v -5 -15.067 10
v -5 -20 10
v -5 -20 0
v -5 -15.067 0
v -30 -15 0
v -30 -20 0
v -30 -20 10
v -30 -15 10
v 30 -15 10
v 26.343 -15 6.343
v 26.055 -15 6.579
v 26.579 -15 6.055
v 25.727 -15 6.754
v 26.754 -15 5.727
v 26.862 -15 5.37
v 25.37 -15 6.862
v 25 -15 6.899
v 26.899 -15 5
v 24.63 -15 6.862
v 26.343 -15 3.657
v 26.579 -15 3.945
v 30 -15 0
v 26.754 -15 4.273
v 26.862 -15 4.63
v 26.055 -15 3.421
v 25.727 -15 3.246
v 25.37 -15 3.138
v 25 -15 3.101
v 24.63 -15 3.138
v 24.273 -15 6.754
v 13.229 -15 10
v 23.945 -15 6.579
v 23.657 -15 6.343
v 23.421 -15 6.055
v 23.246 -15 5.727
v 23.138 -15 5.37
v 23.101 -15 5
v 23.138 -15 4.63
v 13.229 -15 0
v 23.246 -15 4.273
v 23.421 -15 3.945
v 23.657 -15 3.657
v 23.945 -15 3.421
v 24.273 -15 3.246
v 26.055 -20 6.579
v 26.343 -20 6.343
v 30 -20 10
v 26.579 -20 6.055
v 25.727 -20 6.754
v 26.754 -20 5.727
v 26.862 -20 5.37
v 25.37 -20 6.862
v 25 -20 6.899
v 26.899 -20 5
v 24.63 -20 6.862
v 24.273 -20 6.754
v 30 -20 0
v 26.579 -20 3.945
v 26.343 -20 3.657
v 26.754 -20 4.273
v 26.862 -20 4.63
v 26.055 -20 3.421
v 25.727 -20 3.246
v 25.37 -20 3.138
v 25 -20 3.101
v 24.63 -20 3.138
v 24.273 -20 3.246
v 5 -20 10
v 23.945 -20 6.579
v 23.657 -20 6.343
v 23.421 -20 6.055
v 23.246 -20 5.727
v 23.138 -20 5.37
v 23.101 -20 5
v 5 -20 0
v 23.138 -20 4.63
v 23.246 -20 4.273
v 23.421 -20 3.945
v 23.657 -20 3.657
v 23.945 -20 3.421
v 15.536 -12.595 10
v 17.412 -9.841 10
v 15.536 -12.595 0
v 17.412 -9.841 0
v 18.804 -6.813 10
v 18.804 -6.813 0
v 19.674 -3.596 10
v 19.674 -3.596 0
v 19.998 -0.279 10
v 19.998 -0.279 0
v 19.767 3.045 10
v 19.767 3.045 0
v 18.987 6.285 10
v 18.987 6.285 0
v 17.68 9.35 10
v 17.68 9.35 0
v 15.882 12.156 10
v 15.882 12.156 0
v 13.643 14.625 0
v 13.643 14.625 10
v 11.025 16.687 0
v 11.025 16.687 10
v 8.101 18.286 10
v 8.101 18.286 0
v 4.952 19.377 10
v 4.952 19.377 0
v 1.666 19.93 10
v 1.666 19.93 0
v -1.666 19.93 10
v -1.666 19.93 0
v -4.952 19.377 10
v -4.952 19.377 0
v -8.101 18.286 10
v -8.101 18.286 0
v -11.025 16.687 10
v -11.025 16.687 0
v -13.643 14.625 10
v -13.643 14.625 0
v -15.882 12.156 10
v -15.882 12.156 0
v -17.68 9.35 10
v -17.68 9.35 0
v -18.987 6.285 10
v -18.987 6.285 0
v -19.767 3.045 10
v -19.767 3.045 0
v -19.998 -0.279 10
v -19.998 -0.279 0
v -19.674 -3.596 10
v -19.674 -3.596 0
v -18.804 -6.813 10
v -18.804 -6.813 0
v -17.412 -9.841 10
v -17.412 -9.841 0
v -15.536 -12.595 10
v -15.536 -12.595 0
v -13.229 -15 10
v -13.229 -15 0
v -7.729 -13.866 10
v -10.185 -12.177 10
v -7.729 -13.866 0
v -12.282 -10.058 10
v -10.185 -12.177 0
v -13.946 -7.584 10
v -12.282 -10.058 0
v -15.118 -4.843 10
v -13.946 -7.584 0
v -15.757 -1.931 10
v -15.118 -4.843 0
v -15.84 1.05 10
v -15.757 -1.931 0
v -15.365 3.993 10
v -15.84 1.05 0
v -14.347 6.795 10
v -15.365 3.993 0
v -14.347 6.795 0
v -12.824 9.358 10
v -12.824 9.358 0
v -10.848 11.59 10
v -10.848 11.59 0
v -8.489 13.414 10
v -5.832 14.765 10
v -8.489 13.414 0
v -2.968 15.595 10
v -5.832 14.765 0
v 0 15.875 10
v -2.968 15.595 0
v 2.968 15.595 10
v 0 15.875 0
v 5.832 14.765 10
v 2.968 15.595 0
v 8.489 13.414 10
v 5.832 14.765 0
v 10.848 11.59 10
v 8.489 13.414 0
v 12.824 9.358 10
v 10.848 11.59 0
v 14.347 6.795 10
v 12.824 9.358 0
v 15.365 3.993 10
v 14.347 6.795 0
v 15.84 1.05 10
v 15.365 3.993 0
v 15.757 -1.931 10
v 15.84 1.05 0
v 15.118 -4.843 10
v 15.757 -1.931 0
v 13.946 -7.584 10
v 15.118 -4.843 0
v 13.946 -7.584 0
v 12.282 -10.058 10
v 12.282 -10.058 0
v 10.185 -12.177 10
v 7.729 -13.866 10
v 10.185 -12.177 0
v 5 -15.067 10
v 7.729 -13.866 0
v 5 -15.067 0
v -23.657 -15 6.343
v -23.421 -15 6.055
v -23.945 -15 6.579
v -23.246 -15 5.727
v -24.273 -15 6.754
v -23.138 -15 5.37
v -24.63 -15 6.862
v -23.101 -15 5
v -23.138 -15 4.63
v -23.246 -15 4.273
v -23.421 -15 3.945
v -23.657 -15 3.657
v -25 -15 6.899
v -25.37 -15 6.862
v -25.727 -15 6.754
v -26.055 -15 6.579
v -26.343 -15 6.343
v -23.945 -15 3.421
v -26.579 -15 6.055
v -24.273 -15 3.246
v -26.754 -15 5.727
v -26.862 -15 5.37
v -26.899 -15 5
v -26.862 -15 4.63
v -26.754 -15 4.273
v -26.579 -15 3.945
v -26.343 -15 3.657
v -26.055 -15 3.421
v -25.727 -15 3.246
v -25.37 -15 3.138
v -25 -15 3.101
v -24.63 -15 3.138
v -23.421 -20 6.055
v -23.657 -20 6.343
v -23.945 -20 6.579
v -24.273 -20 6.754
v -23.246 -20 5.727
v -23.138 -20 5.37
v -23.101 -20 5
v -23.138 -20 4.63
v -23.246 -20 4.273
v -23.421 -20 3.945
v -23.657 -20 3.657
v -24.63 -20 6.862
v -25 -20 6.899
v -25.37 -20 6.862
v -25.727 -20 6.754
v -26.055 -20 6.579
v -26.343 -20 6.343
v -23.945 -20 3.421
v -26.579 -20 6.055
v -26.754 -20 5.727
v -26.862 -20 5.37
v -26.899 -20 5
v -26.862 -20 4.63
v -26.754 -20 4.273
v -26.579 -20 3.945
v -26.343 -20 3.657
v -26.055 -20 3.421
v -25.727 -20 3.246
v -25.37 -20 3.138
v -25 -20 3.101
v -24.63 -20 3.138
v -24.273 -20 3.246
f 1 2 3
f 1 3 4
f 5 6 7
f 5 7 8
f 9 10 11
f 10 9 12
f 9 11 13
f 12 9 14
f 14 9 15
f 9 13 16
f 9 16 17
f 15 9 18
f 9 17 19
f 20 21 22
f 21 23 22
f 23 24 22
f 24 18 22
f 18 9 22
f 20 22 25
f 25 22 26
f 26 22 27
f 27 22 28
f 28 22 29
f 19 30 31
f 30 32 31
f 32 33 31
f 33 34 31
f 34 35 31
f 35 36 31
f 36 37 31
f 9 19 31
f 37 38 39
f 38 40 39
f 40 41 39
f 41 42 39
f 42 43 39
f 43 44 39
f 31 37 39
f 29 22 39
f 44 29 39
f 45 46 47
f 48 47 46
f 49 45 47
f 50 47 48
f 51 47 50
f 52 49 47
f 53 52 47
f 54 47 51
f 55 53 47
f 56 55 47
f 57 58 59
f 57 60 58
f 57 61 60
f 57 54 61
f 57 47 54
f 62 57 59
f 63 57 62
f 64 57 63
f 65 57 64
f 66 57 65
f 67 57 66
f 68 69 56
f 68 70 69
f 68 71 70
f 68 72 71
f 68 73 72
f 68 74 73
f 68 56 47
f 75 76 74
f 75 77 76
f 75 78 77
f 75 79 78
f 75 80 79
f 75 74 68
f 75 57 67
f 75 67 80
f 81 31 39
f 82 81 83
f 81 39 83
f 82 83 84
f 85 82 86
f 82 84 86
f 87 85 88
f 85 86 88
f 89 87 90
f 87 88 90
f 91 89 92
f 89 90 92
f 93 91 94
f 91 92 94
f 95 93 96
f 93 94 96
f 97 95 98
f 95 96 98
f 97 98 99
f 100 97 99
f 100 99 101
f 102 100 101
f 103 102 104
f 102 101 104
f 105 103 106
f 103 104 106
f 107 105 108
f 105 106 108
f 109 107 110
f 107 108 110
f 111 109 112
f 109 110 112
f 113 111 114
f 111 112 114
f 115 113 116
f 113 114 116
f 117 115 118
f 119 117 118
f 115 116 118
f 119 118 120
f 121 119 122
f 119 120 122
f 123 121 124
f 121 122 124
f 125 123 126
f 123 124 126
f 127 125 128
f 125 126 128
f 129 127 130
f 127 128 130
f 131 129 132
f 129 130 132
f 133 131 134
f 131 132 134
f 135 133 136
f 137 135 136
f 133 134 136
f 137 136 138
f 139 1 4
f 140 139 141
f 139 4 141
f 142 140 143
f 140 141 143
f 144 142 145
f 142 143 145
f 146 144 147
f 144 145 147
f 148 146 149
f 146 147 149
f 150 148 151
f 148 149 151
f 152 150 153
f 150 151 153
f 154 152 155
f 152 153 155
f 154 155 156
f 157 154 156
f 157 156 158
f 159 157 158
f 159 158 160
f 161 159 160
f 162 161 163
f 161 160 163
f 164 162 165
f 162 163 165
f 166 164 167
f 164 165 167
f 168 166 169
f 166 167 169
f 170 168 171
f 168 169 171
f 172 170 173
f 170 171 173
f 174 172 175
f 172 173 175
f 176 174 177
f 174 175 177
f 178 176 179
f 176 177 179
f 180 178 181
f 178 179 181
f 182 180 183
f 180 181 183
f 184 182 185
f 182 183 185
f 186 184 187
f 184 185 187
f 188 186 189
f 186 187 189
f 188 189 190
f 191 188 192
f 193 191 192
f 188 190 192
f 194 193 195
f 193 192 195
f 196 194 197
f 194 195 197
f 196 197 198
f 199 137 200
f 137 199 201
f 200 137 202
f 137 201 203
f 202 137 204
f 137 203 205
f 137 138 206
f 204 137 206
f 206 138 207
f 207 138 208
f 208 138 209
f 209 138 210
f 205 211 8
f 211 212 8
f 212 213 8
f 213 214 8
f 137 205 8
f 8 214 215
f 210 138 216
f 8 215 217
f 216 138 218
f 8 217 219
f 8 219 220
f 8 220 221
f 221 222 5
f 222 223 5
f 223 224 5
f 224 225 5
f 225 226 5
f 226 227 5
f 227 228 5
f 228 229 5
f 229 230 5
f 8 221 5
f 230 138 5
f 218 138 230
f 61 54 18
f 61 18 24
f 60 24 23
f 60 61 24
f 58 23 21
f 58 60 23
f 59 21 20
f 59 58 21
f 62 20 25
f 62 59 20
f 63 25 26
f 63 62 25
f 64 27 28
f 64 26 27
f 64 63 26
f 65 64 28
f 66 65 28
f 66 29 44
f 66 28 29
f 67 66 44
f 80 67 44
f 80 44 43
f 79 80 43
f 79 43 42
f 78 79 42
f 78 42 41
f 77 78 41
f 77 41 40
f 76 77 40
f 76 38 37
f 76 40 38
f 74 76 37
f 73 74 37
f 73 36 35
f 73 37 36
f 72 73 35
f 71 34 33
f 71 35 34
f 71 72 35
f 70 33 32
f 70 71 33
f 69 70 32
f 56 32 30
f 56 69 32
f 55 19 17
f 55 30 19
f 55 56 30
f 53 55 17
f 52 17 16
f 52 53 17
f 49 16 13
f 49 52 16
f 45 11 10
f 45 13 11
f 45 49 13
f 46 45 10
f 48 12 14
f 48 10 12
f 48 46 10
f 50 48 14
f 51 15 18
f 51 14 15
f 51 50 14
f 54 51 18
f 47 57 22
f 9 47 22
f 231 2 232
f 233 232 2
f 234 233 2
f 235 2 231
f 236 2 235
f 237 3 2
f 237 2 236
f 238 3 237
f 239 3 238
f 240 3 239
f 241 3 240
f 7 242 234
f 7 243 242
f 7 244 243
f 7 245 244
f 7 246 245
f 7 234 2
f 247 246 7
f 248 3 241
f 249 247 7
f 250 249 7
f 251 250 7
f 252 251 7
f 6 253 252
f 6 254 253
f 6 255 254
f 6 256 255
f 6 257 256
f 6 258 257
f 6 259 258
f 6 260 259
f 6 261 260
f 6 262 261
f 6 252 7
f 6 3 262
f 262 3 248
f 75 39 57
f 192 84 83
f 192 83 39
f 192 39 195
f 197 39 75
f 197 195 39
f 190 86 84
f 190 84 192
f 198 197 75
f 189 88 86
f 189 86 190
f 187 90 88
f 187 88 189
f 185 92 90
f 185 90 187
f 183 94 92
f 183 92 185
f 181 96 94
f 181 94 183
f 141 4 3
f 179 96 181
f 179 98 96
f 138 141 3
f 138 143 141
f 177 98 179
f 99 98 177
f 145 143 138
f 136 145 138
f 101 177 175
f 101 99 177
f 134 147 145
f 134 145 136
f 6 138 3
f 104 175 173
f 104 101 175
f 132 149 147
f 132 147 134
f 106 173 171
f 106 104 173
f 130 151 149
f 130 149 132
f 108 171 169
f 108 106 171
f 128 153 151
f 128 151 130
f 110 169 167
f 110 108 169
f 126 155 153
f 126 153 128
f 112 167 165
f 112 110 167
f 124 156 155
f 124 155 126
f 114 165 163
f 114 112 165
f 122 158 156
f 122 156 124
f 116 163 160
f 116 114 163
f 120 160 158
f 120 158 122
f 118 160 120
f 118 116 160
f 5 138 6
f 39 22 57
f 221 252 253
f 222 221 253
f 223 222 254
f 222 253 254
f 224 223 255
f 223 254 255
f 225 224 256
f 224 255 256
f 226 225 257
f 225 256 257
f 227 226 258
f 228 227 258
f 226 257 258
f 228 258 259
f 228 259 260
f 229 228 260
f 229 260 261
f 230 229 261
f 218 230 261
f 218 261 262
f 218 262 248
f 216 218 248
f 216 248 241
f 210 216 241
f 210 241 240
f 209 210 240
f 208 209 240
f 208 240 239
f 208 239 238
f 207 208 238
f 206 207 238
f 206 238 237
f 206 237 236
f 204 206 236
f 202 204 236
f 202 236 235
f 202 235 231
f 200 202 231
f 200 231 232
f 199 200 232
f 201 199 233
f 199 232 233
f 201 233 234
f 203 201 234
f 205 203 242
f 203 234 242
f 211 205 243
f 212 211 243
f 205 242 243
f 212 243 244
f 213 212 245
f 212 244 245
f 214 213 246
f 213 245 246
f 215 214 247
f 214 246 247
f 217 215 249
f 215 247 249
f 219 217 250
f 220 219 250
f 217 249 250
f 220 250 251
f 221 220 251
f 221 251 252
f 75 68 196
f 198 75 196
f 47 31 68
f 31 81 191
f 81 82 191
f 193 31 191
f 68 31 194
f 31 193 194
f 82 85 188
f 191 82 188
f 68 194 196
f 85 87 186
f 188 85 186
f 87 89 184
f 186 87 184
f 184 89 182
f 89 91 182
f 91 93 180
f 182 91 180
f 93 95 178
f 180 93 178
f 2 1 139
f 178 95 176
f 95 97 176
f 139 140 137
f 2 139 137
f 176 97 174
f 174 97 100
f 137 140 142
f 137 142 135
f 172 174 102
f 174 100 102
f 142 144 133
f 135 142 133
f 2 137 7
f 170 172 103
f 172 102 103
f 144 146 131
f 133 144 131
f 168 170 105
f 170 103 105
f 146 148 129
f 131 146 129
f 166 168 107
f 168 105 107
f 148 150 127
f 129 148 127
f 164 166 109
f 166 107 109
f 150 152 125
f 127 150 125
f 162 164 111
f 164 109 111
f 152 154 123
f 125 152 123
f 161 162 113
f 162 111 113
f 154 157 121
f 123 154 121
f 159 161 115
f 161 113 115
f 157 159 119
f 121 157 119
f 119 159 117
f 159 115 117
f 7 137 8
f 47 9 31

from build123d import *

# Parameters (mm, degrees)
SKETCH1_R             = 20
BOSS_EXTRUDE1_DEPTH   = 10
SKETCH2_W             = 60
SKETCH2_H             = 5
BOSS_EXTRUDE2_DEPTH   = 10
SKETCH3_R             = 15.875
CUT_EXTRUDE1_DEPTH    = 38.416573868
SKETCH4_W             = 10
SKETCH4_H             = 4.932962302
CUT_EXTRUDE2_DEPTH    = 38.416573868
F_6_CLEARANCE_HOLE1_D = 3.7973


with BuildPart() as part:
    # Sketch1 → Boss-Extrude1 (new body)
    with BuildSketch(Plane.XY):
        Circle(SKETCH1_R)
    extrude(amount=BOSS_EXTRUDE1_DEPTH)

    # Sketch2 → Boss-Extrude2 (add)
    with BuildSketch(Plane(origin=(0, 0, 0), x_dir=(-1, 0, 0), z_dir=(0, 0, -1))):
        with Locations((0, -17.5)):
            Rectangle(SKETCH2_W, SKETCH2_H)
    extrude(amount=-BOSS_EXTRUDE2_DEPTH)

    # Sketch3 → Cut-Extrude1 (cut, through all)
    with BuildSketch(Plane(origin=(0, 0, 0), x_dir=(-1, 0, 0), z_dir=(0, 0, -1))):
        Circle(SKETCH3_R)
    extrude(amount=-CUT_EXTRUDE1_DEPTH, mode=Mode.SUBTRACT)

    # Sketch4 → Cut-Extrude2 (cut, through all)
    with BuildSketch(Plane.XY.offset(10)):
        with Locations((0, -17.533518849)):
            Rectangle(SKETCH4_W, SKETCH4_H)
    extrude(amount=-CUT_EXTRUDE2_DEPTH, mode=Mode.SUBTRACT)

    # #6 Clearance Hole1 (through all)
    with Locations(Plane(origin=(0, -15, 0), x_dir=(1, 0, 0), z_dir=(0, 1, 0))):
        with Locations((-25, -5)):
            f_6_clearance_hole1 = Hole(F_6_CLEARANCE_HOLE1_D / 2)

    # Mirror1: #6 Clearance Hole1 across plane
    add(f_6_clearance_hole1.mirror(Plane(origin=(0, 0, 0), x_dir=(0, 0, 1), z_dir=(1, 0, 0))), mode=Mode.SUBTRACT)


solid = part.part
